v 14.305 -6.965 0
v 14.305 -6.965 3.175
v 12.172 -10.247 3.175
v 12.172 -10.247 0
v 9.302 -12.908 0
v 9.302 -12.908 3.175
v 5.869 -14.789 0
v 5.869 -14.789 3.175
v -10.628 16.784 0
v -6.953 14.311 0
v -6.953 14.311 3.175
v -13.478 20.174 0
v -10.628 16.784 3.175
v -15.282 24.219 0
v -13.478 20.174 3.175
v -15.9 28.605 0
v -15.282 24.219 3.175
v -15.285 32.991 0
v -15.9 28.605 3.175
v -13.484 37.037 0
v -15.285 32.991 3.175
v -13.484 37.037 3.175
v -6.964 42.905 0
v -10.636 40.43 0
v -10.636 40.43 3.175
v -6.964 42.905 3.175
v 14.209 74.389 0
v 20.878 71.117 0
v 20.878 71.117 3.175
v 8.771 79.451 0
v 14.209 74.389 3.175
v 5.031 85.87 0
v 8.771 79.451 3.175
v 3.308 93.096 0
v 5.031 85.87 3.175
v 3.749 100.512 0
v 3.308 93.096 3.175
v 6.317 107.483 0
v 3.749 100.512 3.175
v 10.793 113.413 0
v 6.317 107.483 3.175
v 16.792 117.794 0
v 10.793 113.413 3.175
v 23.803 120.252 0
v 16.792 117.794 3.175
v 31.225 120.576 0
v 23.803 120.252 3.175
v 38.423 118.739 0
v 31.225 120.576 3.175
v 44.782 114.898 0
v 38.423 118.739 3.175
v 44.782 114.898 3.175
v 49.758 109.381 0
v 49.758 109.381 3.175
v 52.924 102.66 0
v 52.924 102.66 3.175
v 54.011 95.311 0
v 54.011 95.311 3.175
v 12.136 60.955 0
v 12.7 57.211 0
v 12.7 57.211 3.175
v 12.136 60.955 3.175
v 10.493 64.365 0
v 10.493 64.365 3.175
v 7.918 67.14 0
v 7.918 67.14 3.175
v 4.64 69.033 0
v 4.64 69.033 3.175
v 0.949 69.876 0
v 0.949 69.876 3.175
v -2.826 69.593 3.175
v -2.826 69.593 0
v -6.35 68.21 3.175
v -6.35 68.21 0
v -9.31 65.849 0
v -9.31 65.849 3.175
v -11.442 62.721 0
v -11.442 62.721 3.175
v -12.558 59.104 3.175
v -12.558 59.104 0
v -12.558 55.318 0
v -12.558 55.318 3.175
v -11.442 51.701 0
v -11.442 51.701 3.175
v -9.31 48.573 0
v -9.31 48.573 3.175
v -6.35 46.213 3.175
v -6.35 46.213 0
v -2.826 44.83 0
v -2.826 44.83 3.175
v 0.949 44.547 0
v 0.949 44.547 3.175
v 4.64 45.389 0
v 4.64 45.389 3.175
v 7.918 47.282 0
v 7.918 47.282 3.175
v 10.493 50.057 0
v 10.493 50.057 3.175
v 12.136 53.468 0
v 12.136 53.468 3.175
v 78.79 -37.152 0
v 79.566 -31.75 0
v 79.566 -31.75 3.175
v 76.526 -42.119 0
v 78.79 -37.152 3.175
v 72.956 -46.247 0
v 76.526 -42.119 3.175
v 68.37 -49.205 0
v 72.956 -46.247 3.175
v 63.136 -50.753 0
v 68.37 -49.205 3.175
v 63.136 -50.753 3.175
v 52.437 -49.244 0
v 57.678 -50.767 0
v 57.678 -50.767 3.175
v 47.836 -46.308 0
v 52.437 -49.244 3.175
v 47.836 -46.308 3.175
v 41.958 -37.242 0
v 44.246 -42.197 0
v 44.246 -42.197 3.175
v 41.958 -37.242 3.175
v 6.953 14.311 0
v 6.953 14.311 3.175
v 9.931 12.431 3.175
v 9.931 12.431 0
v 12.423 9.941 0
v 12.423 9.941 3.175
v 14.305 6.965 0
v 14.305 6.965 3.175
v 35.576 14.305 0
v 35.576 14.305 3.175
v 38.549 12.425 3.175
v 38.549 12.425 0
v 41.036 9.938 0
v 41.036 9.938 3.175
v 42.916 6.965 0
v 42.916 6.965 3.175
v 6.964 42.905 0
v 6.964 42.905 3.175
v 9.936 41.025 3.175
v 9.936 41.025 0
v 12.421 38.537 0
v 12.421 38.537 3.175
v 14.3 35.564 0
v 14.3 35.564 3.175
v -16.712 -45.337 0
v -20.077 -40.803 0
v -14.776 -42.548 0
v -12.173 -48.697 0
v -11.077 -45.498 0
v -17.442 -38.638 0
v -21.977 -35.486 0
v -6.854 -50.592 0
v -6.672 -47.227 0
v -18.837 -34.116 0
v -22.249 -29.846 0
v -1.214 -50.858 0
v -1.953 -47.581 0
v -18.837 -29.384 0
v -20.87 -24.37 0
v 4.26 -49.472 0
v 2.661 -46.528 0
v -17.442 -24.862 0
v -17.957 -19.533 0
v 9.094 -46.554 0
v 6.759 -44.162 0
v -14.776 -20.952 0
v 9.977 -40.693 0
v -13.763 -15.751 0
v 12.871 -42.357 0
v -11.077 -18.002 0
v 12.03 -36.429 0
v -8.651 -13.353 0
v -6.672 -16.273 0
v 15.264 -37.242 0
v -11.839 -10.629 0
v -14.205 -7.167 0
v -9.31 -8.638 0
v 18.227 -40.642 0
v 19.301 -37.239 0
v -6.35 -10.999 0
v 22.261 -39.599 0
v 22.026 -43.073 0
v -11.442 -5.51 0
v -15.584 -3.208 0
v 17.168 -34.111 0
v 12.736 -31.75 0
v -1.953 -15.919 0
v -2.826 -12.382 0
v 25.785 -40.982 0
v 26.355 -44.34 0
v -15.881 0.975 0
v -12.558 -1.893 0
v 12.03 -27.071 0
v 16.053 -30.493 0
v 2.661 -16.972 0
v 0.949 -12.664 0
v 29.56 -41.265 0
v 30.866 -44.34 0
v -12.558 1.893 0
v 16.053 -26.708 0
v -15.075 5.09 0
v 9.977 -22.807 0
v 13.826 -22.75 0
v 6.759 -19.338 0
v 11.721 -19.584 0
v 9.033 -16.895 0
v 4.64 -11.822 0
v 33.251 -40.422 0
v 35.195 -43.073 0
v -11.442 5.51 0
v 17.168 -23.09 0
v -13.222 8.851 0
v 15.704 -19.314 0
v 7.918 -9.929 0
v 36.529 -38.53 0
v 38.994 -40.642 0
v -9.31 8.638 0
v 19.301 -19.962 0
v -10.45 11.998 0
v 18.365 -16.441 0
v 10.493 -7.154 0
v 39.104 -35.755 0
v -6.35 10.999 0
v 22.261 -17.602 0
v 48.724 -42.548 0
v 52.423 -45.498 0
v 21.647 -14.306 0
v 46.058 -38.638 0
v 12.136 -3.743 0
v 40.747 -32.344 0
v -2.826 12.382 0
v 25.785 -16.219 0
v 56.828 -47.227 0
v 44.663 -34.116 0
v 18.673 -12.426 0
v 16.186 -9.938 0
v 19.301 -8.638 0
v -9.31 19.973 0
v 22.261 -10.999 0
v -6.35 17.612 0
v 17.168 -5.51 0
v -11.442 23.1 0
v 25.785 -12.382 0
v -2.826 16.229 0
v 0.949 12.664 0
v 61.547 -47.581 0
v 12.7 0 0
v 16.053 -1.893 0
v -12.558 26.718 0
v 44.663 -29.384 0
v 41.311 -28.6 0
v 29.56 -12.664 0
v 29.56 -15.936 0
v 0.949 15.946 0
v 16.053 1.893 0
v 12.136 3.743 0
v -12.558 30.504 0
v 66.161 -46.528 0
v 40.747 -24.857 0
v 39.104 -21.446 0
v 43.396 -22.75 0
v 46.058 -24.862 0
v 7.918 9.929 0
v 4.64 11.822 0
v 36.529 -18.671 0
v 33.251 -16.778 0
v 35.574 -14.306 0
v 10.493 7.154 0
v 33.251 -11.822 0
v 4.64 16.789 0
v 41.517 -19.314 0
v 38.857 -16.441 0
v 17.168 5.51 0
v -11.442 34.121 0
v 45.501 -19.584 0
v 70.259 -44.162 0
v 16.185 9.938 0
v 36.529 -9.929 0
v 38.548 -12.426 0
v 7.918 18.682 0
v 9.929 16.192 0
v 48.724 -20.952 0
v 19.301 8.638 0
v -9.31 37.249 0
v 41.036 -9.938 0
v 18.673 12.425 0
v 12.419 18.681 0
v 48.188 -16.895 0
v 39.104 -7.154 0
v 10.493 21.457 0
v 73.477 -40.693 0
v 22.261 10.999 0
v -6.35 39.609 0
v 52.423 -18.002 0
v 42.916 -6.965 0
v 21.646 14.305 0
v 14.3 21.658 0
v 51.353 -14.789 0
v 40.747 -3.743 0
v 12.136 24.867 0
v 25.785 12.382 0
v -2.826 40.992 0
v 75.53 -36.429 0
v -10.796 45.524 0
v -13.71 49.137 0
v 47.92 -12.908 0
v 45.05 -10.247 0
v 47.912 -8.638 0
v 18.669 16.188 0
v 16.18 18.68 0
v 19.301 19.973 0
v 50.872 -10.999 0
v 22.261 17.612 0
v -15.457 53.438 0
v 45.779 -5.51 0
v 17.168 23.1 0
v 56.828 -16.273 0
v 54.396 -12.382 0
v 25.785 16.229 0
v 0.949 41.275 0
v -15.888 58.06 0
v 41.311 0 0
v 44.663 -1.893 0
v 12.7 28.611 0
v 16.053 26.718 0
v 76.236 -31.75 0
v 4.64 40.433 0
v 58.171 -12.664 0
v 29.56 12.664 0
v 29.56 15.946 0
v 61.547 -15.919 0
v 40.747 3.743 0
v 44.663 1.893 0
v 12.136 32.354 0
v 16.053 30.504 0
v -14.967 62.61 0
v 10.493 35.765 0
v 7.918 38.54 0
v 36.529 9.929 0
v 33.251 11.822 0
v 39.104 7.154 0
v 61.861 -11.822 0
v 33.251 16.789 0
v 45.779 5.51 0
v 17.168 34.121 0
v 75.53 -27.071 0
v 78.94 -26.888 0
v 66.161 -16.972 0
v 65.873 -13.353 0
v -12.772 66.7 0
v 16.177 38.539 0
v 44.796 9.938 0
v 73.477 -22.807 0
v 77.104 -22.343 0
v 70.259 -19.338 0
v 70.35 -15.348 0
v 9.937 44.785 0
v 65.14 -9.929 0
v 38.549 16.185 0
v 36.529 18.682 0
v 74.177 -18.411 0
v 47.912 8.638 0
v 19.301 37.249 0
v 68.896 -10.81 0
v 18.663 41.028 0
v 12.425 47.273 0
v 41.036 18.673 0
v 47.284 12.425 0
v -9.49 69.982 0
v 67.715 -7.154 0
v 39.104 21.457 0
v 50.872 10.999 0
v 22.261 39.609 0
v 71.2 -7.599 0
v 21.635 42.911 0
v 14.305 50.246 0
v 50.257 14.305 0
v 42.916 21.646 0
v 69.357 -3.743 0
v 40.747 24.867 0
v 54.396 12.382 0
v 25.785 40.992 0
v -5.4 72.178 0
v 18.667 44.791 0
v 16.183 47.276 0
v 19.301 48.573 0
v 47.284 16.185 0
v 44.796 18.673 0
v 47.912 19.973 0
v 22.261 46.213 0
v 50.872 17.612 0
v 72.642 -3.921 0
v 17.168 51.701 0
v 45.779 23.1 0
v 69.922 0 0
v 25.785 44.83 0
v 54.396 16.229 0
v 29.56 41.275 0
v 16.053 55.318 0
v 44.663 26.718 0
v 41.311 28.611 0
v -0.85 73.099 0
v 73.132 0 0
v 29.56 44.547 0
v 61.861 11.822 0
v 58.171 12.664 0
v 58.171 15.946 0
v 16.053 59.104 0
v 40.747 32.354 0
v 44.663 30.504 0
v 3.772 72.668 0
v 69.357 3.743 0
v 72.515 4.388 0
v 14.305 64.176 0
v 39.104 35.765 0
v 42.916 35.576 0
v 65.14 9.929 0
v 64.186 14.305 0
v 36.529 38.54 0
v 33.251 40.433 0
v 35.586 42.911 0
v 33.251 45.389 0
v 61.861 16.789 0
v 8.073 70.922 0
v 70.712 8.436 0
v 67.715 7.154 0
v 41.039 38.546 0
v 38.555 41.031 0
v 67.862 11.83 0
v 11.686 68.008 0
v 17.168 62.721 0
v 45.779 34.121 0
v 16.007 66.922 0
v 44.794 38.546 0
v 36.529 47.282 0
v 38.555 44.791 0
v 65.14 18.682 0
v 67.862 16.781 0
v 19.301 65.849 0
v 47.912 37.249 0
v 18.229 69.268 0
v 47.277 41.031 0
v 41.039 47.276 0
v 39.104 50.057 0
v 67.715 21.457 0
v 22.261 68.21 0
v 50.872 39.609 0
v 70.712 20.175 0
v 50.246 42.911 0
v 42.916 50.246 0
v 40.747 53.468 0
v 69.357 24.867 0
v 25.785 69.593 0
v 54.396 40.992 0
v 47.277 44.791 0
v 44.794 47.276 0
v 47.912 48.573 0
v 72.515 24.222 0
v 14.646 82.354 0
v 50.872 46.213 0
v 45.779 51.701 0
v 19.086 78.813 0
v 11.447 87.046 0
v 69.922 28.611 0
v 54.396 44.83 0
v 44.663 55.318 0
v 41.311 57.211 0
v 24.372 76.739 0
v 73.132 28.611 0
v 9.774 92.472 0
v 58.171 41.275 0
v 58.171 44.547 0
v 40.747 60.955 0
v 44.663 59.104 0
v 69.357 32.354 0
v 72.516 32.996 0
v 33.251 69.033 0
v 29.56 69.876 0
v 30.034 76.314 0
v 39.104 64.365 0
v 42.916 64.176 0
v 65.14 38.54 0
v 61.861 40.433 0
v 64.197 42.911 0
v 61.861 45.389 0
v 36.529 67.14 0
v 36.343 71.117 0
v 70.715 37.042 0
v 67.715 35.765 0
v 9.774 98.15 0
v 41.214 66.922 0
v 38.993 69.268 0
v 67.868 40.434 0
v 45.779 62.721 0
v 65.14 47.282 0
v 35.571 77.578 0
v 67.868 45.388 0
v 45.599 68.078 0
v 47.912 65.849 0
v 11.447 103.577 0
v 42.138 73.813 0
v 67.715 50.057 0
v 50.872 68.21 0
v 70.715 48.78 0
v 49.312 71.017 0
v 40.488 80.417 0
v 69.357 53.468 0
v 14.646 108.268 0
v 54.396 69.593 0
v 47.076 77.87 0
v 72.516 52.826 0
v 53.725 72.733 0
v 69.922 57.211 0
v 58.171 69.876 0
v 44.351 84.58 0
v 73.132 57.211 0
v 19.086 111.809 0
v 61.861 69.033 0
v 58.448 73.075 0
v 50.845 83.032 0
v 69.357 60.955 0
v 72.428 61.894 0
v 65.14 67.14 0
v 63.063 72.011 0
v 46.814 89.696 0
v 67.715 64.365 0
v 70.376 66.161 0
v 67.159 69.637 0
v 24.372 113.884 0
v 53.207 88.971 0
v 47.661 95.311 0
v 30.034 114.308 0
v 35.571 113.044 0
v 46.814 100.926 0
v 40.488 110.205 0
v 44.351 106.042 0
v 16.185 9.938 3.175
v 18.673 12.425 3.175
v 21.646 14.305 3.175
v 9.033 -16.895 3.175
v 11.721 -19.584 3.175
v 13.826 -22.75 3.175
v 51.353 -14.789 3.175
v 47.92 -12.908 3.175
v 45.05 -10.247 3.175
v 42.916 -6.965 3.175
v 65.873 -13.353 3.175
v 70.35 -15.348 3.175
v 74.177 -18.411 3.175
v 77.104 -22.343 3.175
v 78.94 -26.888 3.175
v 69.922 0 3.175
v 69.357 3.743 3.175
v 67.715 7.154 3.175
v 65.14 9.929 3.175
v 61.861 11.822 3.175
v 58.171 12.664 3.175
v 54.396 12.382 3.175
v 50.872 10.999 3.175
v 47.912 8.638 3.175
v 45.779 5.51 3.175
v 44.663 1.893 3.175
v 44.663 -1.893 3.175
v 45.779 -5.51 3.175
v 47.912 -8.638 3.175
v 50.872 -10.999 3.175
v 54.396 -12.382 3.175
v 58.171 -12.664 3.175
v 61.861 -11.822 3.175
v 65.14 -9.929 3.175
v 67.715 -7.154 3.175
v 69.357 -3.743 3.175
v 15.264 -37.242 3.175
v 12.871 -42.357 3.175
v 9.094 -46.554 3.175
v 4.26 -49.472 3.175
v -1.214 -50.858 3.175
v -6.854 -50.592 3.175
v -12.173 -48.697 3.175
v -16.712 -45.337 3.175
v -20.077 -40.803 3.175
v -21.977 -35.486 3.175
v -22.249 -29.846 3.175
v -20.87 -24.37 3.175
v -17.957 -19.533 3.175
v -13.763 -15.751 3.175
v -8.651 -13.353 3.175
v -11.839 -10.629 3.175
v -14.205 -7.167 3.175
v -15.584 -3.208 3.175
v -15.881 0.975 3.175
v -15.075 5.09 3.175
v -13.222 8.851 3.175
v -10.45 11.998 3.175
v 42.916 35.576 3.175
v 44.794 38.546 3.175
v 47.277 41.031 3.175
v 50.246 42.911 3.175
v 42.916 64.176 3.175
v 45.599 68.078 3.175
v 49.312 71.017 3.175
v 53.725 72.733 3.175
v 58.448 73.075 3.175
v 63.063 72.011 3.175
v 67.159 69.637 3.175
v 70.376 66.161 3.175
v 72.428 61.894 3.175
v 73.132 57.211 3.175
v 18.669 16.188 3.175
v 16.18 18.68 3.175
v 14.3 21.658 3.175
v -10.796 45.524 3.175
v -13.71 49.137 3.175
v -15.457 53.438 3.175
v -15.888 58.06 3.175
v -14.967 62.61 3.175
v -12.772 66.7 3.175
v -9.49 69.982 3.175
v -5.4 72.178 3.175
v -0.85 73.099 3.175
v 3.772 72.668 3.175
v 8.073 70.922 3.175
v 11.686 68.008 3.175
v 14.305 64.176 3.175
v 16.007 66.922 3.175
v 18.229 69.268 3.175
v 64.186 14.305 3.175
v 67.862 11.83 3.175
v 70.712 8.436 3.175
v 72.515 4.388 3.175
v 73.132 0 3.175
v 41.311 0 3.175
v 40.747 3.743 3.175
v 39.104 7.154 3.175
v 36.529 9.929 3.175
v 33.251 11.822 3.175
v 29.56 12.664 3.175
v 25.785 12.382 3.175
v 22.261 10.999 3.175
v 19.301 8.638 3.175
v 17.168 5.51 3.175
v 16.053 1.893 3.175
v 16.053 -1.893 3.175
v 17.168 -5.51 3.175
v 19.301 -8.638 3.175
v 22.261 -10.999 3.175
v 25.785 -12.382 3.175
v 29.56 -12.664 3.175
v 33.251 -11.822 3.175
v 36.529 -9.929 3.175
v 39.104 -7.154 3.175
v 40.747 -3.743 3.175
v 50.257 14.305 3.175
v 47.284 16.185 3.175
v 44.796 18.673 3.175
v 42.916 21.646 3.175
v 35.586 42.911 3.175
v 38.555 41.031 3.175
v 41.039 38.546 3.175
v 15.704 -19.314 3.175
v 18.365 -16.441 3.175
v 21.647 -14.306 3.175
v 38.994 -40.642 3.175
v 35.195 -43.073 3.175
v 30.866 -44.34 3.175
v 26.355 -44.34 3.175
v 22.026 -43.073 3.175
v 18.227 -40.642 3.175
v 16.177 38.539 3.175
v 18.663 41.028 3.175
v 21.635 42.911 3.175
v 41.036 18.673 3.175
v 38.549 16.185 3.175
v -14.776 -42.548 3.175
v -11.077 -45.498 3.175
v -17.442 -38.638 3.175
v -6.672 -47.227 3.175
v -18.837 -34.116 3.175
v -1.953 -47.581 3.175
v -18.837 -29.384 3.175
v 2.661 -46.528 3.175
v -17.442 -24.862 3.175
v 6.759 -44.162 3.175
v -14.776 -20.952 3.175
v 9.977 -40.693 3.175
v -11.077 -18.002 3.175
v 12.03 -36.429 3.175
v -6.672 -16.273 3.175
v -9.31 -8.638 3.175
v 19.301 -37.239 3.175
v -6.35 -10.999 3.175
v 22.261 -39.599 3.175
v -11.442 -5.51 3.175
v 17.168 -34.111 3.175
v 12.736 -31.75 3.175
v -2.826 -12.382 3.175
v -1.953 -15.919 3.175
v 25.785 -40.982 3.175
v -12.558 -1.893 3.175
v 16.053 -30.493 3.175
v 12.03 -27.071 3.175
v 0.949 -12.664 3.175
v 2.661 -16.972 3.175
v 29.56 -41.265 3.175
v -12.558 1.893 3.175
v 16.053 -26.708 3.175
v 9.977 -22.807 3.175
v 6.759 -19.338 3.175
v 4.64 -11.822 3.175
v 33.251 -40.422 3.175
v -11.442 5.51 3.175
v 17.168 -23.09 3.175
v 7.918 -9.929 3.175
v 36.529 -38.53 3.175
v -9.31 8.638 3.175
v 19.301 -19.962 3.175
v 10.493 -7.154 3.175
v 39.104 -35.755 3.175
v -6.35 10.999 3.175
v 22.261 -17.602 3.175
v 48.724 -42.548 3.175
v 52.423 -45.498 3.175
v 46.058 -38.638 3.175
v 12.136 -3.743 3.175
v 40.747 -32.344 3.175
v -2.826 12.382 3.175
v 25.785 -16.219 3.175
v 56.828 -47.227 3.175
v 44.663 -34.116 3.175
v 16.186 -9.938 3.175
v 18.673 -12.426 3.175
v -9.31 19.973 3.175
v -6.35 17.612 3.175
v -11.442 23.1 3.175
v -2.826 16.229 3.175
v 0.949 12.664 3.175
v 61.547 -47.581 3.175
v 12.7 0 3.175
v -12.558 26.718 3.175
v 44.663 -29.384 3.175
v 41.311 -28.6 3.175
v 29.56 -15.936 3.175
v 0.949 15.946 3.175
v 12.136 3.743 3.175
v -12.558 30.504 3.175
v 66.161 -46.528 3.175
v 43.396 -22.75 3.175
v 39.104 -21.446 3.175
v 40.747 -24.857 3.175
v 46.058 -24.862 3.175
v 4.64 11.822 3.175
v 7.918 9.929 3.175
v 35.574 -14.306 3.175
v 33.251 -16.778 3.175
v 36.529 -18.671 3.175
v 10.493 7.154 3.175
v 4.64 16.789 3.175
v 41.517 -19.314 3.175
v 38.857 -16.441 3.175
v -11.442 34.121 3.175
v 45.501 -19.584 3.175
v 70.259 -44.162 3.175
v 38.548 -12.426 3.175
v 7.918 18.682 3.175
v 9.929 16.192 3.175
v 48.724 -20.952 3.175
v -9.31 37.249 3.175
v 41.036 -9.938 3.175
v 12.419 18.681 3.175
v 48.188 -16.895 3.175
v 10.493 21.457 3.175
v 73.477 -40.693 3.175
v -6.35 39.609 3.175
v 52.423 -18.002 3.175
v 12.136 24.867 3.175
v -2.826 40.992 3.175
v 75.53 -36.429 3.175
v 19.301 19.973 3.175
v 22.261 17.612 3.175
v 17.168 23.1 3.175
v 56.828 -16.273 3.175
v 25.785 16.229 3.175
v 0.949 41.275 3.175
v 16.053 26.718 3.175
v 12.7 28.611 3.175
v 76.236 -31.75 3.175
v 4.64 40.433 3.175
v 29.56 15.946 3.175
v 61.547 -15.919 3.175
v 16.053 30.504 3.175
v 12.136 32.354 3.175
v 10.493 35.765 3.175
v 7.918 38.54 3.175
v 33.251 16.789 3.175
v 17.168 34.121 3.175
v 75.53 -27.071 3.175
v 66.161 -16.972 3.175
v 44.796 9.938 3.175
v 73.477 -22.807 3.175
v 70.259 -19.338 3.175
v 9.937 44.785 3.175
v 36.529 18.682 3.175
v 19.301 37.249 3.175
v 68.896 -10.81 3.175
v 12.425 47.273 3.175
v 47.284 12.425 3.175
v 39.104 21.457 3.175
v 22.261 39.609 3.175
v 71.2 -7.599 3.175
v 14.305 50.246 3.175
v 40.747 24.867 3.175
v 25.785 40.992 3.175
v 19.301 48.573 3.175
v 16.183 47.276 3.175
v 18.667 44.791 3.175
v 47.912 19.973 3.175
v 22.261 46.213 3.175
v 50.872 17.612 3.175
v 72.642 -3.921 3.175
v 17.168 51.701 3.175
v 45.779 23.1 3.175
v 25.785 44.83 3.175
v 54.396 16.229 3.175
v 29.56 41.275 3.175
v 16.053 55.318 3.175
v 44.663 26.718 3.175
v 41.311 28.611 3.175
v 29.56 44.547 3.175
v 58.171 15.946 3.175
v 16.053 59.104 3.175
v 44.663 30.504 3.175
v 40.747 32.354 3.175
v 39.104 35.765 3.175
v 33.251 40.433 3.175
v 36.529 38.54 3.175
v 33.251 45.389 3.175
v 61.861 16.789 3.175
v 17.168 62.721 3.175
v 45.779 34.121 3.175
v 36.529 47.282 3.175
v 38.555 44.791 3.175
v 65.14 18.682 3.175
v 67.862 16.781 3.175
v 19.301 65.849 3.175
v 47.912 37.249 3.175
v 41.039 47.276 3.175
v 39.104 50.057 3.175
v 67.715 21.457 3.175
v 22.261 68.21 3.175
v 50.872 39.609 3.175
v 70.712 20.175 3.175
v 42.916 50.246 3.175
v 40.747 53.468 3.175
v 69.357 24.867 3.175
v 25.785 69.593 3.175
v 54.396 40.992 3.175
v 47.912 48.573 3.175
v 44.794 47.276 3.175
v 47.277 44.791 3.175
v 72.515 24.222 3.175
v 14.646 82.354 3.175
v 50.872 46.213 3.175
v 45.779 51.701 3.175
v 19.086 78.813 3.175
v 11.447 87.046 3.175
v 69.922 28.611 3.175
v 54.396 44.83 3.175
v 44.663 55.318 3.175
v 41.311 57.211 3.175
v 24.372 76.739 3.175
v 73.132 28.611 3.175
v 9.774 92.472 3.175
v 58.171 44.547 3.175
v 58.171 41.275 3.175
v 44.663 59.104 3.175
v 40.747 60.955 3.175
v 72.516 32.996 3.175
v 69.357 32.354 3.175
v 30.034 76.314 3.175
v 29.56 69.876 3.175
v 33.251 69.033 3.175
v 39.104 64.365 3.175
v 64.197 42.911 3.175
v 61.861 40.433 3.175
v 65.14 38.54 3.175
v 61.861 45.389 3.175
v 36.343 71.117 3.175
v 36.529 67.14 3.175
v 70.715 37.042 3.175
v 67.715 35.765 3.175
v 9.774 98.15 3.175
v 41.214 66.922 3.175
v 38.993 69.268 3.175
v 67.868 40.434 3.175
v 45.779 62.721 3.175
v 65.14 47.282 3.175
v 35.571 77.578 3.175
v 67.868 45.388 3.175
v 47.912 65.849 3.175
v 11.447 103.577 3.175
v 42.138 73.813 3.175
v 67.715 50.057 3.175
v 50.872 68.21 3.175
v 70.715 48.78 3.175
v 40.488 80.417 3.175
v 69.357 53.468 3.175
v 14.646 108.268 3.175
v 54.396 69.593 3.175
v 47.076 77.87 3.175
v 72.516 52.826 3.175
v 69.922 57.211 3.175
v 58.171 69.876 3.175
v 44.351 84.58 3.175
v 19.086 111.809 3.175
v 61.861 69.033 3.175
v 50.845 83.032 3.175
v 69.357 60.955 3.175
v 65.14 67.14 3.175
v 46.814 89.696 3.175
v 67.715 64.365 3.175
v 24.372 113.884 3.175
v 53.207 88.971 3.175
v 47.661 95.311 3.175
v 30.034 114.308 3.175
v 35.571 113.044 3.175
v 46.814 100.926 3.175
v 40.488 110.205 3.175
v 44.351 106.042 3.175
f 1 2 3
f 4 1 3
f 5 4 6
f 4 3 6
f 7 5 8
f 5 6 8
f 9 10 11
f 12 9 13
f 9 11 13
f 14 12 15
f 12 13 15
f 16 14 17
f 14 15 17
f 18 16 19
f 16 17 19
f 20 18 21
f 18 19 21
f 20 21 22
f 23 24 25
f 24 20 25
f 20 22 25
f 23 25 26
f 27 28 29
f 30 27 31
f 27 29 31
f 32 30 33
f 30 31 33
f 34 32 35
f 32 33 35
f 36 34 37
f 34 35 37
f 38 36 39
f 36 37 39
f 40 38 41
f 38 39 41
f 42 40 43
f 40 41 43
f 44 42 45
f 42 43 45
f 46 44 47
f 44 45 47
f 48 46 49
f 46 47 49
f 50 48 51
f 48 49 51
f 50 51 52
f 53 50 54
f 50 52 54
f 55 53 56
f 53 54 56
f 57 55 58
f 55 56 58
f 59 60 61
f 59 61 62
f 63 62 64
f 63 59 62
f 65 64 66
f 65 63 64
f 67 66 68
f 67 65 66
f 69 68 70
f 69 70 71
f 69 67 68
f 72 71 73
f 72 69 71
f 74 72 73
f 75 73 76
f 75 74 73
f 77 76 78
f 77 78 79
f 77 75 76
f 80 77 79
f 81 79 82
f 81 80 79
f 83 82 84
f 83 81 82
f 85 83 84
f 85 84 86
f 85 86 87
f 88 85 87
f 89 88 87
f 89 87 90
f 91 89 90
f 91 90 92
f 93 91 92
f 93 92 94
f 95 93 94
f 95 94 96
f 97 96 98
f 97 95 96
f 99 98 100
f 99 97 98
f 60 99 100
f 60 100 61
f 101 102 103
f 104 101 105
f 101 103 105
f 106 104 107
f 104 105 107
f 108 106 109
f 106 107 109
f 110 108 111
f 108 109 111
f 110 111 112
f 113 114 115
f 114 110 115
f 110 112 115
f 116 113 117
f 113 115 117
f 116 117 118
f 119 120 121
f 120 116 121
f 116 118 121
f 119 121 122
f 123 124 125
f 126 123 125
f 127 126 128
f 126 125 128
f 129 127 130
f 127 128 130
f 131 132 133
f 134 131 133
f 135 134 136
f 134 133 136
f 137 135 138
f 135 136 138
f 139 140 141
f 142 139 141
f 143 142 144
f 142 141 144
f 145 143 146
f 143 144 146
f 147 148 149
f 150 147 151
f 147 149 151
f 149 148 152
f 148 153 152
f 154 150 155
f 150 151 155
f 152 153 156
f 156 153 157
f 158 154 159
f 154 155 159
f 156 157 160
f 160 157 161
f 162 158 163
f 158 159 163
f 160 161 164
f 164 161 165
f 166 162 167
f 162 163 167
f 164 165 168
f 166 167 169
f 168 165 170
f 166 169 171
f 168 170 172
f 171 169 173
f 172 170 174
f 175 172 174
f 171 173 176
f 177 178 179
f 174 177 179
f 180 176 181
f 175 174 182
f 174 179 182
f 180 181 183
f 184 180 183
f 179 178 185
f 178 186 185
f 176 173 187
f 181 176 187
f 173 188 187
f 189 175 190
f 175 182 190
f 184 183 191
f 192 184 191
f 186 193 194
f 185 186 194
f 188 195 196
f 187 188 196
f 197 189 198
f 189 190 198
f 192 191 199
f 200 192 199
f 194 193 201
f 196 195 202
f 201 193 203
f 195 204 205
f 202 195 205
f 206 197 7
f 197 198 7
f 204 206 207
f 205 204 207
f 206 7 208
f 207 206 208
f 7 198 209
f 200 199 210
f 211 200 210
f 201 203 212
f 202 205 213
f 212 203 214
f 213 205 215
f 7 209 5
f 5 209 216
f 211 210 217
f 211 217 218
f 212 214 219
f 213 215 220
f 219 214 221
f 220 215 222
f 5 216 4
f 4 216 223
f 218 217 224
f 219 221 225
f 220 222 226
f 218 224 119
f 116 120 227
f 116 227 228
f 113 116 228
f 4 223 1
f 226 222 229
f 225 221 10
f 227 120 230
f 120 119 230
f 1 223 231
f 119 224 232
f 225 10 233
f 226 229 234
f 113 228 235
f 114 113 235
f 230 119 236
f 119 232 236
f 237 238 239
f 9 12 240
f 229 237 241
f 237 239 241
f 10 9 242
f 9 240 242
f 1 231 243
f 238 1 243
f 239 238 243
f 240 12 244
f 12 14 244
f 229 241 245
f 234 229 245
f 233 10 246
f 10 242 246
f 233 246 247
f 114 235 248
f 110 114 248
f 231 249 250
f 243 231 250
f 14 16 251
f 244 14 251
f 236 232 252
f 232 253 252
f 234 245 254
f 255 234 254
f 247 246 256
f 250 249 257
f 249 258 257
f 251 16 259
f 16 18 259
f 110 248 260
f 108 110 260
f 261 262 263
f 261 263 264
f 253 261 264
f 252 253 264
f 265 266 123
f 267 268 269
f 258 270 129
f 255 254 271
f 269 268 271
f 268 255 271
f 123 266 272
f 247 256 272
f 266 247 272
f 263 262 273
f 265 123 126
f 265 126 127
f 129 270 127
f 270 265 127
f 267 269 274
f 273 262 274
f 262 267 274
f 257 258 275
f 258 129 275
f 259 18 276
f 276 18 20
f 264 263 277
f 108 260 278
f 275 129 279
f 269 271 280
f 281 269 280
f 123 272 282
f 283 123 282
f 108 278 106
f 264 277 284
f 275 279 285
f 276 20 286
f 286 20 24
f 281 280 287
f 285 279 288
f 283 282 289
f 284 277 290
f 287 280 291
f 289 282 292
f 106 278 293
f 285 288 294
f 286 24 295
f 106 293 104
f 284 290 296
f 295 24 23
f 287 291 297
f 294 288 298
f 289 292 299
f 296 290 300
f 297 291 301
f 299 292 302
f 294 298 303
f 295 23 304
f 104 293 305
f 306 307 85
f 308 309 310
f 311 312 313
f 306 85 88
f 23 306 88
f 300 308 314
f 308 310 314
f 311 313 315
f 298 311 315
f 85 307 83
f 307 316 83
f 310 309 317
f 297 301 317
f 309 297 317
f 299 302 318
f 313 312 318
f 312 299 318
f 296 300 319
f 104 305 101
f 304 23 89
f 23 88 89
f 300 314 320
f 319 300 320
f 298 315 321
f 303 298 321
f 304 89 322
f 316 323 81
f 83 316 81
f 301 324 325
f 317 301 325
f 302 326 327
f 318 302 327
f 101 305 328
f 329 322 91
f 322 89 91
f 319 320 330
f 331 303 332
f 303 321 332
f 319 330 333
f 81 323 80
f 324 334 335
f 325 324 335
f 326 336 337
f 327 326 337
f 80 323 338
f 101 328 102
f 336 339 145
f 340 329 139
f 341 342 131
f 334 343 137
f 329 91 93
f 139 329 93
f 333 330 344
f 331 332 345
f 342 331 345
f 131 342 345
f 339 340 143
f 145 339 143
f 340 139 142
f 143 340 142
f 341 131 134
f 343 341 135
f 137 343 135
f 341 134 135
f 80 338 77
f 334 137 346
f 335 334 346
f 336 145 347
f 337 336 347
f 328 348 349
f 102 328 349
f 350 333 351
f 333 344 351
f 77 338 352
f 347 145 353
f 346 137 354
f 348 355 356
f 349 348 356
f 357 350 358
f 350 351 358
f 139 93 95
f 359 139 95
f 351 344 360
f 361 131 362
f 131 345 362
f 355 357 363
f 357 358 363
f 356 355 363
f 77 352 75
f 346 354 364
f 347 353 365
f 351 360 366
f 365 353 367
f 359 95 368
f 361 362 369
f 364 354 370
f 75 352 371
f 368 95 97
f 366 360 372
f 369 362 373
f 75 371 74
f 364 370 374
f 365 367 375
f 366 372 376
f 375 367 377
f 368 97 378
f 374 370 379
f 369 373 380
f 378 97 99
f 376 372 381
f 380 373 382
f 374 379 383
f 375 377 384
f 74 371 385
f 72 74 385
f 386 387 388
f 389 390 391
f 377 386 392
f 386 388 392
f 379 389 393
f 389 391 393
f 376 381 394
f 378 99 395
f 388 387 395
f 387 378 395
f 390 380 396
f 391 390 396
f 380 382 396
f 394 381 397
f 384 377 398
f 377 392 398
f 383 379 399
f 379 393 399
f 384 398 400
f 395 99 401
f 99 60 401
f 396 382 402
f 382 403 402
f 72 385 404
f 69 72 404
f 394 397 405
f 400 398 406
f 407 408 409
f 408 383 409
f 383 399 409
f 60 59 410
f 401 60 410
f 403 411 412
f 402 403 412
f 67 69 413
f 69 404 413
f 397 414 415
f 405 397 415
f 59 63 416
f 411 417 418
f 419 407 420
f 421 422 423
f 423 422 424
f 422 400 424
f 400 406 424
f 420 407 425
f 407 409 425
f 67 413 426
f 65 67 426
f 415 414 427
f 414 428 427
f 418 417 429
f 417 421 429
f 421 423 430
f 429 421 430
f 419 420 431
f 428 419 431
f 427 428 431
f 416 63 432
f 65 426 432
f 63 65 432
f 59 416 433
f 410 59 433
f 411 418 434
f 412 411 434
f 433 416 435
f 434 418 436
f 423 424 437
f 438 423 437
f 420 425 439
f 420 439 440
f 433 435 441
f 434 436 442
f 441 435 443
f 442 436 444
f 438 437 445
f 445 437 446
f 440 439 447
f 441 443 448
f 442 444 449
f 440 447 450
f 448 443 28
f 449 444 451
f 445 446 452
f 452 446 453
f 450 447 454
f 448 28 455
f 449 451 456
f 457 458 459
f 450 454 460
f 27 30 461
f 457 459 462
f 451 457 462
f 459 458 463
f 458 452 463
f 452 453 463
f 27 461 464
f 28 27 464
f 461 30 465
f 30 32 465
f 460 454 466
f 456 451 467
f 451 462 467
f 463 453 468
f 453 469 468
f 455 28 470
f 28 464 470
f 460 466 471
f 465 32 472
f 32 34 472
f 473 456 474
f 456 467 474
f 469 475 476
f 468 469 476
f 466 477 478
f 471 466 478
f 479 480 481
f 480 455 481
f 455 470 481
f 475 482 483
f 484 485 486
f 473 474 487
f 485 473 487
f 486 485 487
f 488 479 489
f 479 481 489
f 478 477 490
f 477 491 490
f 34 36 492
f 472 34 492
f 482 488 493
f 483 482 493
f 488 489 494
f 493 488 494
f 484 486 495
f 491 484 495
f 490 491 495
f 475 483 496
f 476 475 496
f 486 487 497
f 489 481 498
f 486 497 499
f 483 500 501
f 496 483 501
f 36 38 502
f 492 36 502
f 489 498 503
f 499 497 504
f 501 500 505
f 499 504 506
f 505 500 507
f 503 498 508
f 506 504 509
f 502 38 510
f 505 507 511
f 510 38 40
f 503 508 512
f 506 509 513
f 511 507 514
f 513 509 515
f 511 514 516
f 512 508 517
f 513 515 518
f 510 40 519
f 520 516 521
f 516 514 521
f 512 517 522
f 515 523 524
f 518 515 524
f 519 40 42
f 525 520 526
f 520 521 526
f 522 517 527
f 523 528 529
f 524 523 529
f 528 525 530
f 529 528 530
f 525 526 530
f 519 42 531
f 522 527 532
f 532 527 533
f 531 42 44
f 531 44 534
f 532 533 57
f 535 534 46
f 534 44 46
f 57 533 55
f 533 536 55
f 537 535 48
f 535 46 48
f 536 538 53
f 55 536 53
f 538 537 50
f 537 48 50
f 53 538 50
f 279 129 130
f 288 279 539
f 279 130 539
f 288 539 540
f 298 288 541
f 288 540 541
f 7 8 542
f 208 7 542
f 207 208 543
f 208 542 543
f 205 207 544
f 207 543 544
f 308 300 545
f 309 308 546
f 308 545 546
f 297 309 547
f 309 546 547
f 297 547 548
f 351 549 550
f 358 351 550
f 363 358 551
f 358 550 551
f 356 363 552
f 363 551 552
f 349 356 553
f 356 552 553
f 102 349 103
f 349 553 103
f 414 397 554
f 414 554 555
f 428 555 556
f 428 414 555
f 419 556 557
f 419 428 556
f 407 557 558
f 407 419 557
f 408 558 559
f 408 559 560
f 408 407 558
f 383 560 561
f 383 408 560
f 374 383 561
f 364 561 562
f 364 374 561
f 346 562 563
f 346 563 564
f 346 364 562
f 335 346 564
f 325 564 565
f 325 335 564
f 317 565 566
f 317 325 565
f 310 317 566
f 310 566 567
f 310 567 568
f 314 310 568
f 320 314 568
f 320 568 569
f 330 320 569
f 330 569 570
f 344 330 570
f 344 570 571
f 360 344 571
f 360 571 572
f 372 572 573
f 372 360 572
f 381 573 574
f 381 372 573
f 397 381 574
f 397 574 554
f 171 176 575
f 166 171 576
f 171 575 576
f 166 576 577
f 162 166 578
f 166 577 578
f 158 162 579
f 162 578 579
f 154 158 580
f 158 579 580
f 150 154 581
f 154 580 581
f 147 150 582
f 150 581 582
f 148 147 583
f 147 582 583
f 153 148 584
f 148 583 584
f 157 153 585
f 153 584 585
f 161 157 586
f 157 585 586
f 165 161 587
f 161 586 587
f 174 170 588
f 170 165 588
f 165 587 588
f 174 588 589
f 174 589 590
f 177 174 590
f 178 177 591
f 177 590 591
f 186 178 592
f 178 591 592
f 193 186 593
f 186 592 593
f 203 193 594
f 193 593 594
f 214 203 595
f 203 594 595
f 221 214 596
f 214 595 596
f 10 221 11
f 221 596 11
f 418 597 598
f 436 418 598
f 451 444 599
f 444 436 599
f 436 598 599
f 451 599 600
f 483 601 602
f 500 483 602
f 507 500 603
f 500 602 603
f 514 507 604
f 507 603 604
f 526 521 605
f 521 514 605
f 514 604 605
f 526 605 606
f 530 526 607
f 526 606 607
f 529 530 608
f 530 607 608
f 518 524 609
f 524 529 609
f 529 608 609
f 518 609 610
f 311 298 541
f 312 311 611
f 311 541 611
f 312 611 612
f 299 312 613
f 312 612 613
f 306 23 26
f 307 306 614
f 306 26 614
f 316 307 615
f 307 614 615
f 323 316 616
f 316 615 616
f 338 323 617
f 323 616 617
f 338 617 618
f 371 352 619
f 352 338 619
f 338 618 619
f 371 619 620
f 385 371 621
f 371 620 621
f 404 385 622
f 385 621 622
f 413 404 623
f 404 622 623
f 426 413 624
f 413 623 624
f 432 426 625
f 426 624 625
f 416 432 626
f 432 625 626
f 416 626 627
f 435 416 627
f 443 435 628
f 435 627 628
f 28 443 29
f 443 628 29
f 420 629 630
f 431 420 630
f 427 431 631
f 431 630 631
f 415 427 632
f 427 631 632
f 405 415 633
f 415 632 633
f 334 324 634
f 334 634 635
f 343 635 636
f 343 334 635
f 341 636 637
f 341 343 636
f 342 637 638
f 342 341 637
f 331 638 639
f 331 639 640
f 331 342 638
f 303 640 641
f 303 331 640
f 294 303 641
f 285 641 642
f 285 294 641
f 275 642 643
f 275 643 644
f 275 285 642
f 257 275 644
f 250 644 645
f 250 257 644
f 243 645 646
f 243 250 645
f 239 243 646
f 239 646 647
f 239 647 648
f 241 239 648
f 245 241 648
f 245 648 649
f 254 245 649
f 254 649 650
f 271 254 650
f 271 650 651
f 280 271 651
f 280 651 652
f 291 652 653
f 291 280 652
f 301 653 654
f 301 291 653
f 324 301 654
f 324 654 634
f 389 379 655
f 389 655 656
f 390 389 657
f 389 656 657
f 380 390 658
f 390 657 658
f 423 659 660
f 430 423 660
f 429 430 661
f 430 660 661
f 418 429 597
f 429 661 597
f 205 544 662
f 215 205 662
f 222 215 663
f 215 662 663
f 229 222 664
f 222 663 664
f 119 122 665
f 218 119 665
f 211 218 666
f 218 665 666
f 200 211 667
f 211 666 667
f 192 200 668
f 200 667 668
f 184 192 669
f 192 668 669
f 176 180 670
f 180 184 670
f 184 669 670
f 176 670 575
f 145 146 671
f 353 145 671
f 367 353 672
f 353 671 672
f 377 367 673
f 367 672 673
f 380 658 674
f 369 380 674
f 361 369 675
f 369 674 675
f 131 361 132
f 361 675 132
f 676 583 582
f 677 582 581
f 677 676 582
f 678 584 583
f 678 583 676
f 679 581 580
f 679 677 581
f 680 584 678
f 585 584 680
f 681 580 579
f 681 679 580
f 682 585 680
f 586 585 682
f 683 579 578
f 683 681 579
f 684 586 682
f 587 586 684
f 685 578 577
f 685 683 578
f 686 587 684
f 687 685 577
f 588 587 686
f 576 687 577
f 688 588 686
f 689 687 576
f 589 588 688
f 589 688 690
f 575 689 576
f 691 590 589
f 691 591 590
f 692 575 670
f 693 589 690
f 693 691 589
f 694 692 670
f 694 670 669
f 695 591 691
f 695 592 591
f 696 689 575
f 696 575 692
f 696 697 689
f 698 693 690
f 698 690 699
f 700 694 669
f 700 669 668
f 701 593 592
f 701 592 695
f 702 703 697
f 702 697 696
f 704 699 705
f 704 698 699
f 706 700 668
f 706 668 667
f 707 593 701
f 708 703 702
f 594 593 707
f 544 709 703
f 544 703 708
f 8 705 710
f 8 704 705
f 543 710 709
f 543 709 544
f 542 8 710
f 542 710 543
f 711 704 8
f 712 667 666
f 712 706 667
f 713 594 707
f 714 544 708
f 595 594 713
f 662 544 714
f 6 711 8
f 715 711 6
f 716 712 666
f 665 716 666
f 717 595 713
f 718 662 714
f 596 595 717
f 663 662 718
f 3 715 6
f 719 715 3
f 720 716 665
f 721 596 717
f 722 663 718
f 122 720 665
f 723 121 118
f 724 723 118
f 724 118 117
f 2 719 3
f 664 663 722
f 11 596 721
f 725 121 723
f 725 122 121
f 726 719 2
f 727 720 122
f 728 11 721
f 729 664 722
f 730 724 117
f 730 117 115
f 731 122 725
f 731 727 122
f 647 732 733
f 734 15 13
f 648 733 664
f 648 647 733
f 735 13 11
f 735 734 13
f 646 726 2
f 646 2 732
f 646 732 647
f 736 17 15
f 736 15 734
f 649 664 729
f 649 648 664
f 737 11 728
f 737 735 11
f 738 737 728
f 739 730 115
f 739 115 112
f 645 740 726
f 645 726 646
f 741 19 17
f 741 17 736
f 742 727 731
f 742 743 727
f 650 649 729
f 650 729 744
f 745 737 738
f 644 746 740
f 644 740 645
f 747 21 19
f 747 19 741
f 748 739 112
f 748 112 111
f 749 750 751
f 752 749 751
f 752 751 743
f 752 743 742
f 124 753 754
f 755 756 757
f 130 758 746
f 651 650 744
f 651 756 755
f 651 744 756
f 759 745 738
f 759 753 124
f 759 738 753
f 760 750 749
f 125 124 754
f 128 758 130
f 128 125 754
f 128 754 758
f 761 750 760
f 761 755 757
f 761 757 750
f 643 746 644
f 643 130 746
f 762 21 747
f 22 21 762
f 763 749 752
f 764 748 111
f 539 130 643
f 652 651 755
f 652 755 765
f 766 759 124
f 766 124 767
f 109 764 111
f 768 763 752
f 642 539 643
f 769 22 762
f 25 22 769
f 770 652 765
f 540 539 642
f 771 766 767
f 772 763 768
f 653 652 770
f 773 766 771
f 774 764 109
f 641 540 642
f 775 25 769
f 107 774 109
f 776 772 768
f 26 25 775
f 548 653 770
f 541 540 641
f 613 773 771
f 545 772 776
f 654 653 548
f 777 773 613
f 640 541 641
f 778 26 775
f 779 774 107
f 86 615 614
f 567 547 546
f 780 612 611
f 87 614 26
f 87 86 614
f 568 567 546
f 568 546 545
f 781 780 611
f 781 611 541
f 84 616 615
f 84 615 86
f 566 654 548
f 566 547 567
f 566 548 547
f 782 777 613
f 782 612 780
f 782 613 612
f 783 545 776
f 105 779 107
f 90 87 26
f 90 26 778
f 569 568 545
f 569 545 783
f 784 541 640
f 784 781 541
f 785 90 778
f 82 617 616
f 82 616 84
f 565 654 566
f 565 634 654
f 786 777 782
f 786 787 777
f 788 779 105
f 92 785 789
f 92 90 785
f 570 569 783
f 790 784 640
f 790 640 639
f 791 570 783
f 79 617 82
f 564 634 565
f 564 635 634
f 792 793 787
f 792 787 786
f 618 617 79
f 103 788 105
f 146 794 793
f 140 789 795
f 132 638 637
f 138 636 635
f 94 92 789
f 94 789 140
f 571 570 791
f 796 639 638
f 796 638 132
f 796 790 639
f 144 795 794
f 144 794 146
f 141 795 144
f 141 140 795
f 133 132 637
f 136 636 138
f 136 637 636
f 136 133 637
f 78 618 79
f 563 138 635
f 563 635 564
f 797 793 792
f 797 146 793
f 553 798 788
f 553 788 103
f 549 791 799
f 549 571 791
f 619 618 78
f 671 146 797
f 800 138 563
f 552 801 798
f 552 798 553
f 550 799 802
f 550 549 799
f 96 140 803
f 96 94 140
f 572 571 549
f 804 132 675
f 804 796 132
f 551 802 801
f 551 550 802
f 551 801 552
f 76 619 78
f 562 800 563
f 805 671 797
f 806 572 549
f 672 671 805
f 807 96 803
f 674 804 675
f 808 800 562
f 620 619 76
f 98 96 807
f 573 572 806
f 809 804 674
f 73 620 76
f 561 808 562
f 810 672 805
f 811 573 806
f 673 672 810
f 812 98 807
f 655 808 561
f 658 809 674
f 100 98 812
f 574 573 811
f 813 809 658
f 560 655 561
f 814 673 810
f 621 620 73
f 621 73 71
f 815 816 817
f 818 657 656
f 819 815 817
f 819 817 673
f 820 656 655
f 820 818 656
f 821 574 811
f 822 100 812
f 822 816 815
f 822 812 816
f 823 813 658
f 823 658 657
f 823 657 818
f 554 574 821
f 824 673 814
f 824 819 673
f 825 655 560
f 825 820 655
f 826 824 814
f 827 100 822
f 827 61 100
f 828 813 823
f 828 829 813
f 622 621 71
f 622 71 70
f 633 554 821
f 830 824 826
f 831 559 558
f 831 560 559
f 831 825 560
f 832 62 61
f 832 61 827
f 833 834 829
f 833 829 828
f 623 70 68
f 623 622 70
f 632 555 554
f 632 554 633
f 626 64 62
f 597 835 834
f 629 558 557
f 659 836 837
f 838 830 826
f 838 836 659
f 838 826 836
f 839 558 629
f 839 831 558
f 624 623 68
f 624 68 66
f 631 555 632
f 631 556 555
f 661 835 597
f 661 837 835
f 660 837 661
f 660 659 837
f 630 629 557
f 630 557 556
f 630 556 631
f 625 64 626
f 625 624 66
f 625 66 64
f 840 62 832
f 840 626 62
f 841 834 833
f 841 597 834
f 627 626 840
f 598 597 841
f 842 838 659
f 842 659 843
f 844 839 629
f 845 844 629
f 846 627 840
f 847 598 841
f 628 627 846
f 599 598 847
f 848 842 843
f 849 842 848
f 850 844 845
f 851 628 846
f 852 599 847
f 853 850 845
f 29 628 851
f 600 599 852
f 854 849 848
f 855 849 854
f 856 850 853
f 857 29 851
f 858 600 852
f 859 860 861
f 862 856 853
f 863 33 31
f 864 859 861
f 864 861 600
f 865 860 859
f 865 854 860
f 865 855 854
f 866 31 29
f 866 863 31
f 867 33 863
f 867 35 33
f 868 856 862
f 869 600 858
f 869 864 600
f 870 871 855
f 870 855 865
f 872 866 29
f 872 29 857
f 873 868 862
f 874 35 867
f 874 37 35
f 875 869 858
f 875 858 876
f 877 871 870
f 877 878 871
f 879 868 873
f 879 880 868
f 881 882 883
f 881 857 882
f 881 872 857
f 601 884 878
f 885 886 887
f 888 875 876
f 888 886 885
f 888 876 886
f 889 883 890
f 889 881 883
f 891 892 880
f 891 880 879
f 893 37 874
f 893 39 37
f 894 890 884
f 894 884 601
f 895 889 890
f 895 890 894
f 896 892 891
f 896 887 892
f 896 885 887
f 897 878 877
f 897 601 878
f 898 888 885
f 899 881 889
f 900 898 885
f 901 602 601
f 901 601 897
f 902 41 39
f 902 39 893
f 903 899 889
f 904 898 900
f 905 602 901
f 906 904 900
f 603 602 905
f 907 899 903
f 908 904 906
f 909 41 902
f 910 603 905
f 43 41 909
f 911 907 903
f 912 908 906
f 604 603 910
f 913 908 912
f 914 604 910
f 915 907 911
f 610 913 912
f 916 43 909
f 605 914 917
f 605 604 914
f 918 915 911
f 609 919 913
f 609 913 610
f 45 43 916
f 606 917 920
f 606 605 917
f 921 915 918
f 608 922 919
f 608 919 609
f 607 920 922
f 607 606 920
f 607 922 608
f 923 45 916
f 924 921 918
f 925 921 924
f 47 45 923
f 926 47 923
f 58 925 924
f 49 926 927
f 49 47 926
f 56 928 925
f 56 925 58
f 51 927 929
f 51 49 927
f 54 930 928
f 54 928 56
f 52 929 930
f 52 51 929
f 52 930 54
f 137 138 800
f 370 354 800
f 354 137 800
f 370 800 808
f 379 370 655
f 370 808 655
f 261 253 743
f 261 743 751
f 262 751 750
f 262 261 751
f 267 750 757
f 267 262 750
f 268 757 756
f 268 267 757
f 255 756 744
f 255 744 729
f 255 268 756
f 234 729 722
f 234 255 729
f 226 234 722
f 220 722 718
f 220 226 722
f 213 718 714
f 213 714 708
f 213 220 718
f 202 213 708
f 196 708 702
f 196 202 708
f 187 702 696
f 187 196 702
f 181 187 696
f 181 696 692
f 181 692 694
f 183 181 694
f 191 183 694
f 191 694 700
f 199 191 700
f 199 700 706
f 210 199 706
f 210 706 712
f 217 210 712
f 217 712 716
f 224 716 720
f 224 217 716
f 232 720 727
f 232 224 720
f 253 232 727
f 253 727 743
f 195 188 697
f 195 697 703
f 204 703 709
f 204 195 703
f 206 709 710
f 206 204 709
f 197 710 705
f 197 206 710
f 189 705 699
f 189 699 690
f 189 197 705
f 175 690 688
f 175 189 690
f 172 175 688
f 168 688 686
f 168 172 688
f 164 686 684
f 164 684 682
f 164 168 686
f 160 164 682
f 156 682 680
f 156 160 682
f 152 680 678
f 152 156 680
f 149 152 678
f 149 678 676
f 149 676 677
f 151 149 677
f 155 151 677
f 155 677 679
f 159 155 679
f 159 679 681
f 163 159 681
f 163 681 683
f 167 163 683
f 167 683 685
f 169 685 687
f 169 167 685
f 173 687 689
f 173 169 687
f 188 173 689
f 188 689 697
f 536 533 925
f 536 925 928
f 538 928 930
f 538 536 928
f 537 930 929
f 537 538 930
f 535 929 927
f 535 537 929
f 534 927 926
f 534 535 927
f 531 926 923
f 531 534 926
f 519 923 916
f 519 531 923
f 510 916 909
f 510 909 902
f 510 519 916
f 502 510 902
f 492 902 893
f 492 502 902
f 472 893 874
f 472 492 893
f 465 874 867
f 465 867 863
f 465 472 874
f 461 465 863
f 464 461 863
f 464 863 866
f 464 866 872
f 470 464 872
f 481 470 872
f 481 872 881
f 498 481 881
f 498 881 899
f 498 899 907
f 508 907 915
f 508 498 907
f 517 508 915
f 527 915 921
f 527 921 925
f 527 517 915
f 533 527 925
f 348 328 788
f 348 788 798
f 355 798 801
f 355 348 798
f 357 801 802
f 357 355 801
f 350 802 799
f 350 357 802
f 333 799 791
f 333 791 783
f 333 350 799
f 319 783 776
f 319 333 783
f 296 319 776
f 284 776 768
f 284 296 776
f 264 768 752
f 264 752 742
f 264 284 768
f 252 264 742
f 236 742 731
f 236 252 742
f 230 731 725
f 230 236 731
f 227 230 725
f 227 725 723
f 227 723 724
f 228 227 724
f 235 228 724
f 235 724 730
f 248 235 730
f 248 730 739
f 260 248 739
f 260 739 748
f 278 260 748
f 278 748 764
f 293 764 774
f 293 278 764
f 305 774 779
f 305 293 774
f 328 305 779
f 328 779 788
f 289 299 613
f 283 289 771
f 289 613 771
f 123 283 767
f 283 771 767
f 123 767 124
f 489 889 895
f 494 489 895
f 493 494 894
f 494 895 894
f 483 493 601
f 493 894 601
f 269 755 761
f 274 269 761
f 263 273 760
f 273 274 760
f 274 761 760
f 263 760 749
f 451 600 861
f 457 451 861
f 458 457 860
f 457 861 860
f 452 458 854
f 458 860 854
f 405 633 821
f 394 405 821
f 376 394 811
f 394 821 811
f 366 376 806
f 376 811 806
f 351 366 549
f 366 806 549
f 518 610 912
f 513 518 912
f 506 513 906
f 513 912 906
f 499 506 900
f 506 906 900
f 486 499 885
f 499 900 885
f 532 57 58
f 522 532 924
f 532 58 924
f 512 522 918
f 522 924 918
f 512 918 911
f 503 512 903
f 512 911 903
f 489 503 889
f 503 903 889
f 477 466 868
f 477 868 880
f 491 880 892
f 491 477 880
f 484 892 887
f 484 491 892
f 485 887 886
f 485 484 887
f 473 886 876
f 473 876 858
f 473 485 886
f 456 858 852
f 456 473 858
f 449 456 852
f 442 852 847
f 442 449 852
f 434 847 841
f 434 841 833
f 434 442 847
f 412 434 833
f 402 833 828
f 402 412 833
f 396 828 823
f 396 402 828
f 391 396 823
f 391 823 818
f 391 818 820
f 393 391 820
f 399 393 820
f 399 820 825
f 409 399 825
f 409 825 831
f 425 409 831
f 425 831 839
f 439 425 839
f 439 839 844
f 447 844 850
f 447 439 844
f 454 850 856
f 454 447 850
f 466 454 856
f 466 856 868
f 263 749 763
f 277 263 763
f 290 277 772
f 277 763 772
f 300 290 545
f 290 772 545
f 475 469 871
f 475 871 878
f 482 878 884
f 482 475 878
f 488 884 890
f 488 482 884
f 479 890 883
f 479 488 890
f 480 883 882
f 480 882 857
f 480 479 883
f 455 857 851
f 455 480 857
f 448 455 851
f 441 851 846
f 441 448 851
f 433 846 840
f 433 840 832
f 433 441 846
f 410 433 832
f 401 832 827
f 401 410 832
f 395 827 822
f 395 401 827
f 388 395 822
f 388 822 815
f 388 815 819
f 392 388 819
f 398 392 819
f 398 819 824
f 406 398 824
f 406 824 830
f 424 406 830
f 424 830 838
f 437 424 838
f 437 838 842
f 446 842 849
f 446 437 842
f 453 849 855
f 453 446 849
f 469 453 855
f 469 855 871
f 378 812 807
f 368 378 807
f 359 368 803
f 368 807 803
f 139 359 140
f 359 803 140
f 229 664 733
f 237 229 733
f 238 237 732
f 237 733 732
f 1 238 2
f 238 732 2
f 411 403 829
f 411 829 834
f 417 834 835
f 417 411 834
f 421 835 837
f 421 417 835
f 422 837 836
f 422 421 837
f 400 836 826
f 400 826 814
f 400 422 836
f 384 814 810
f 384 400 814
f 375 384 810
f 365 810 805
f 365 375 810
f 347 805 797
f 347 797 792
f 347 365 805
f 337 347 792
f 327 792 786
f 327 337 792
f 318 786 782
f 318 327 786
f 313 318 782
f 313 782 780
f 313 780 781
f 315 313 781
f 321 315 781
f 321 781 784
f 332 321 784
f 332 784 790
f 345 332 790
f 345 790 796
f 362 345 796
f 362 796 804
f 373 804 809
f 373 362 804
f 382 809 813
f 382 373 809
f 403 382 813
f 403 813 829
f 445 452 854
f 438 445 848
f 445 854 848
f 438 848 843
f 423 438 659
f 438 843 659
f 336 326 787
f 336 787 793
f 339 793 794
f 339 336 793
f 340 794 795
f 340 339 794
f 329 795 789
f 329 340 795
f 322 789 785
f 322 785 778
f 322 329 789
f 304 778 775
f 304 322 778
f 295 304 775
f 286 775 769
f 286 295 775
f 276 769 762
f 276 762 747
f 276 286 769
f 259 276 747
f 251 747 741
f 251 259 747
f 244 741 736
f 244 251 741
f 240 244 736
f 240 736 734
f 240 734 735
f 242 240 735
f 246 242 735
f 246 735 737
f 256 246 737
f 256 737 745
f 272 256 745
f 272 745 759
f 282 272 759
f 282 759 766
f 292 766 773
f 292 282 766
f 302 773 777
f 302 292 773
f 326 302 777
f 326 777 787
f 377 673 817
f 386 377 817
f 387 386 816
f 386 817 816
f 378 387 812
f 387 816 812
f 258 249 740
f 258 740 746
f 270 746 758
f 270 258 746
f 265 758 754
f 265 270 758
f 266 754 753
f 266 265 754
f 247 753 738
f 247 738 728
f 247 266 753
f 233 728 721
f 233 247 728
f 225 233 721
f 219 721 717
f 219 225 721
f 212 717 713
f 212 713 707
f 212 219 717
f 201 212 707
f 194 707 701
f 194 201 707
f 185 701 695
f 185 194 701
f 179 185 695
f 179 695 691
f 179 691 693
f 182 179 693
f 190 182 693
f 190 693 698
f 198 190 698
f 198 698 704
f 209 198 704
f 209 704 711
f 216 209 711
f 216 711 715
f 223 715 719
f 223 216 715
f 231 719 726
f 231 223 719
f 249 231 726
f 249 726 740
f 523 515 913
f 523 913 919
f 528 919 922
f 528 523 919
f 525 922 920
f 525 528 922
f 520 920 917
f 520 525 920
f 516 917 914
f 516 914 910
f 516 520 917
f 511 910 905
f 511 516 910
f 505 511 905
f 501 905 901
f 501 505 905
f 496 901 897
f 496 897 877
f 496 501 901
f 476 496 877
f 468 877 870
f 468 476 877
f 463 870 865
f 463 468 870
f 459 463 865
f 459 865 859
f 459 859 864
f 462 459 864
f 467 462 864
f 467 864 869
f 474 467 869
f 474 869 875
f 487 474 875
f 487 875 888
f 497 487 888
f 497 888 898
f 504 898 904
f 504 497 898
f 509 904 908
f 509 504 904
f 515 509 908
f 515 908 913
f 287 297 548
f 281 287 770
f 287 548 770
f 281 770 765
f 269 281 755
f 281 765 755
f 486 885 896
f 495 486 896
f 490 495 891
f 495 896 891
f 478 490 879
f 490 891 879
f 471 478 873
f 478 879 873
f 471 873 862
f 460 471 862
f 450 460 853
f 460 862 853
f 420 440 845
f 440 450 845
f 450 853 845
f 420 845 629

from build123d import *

# Parameters (mm, degrees)
F0_W     = 112.4385967851
F0_H     = 188.8671554625
F0_R     = 15.875
F0_R_2   = 12.7
F0_R_3   = 19.05
F1_DEPTH = 3.175
F2_W     = 112.4385967851
F2_H     = 188.8671554625
F3_DEPTH = 25.4


with BuildPart() as f1:
    # F0 (on Top) → F1 (new body)
    with BuildSketch(Plane.XY):
        with Locations((28.6107622087, 28.6107677966)):
            Rectangle(F0_W, F0_H)
        with Locations((-3.1392377913, -31.75)):
            Circle(F0_R, mode=Mode.SUBTRACT)
        with Locations((28.6107622087, -28.6004)):
            Circle(F0_R_2, mode=Mode.SUBTRACT)
        Circle(F0_R_2, mode=Mode.SUBTRACT)
        with Locations((28.6107622087, 0)):
            Circle(F0_R_2, mode=Mode.SUBTRACT)
        with Locations((60.3607622087, -31.75)):
            Circle(F0_R, mode=Mode.SUBTRACT)
        with Locations((57.2215244174, 0)):
            Circle(F0_R_2, mode=Mode.SUBTRACT)
        with Locations((0, 28.6107677966)):
            Circle(F0_R_2, mode=Mode.SUBTRACT)
        with Locations((0, 57.2111677966)):
            Circle(F0_R_2, mode=Mode.SUBTRACT)
        with Locations((28.6107622087, 28.6107677966)):
            Circle(F0_R_2, mode=Mode.SUBTRACT)
        with Locations((28.6107622087, 57.2111677966)):
            Circle(F0_R_2, mode=Mode.SUBTRACT)
        with Locations((28.6107622087, 95.3111677966)):
            Circle(F0_R_3, mode=Mode.SUBTRACT)
        with Locations((57.2215244174, 28.6107677966)):
            Circle(F0_R_2, mode=Mode.SUBTRACT)
        with Locations((57.2215244174, 57.2111677966)):
            Circle(F0_R_2, mode=Mode.SUBTRACT)
    extrude(amount=F1_DEPTH)

    # F2 (on face) → F3 (cut)
    with BuildSketch(Plane.XY.offset(3.175)):
        with Locations((28.6107622087, 28.6107677966)):
            Rectangle(F2_W, F2_H)
        with BuildLine():
            ThreePointArc((20.8784768956, 71.1167105009), (13.6314439157, 115.824091125), (54.0107622087, 95.3111677966))
            ThreePointArc((54.0107622087, 95.3111677966), (49.1236855371, 80.3318495036), (36.3430475218, 71.1167105009))
            ThreePointArc((36.3430475218, 71.1167105009), (40.1631717397, 68.1516517023), (42.9161433131, 64.1759668261))
            ThreePointArc((42.9161433131, 64.1759668261), (60.7952365635, 72.715390949), (73.1322866261, 57.2111677966))
            ThreePointArc((73.1322866261, 57.2111677966), (70.7147963313, 48.7800369638), (64.1969551584, 42.9109677966))
            ThreePointArc((64.1969551584, 42.9109677966), (70.7147963313, 37.0418986294), (73.1322866261, 28.6107677966))
            ThreePointArc((73.1322866261, 28.6107677966), (70.7116620279, 20.1746228647), (64.1863240909, 14.3053870058))
            ThreePointArc((64.1863240909, 14.3053870058), (70.7116660444, 8.4361490481), (73.132292214, 0))
            ThreePointArc((73.132292214, 0), (71.2000982328, -7.5994740585), (65.8728052171, -13.3531970855))
            ThreePointArc((65.8728052171, -13.3531970855), (75.766649881, -20.2833701277), (79.5655786775, -31.75))
            ThreePointArc((79.5655786775, -31.75), (63.1358397408, -50.7532607805), (41.9579378153, -37.2419058575))
            ThreePointArc((41.9579378153, -37.2419058575), (28.6107622087, -44.5008), (15.2635866021, -37.2419058575))
            ThreePointArc((15.2635866021, -37.2419058575), (-16.7116606729, -45.3372849651), (-8.6512807997, -13.3531970855))
            ThreePointArc((-8.6512807997, -13.3531970855), (-15.8808701583, 0.9749332764), (-6.9529550782, 14.3111476674))
            ThreePointArc((-6.9529550782, 14.3111476674), (-15.9003988973, 28.6048460855), (-6.9636042292, 42.9052050468))
            ThreePointArc((-6.9636042292, 42.9052050468), (-11.2510776635, 68.4613058168), (14.3053811044, 64.1759668261))
            ThreePointArc((14.3053811044, 64.1759668261), (17.0583526777, 68.1516517023), (20.8784768956, 71.1167105009))
        make_face(mode=Mode.SUBTRACT)
        with BuildLine():
            ThreePointArc((14.3053811043, -6.9648117949), (10.8191046051, -11.6661693551), (5.8687746425, -14.7888476926))
            ThreePointArc((5.8687746425, -14.7888476926), (10.4436598742, -18.1731864338), (13.8259486181, -22.7495874708))
            ThreePointArc((13.8259486181, -22.7495874708), (16.9457643394, -17.795283394), (21.6471515982, -14.3059658585))
            ThreePointArc((21.6471515982, -14.3059658585), (17.3606227479, -11.2510841251), (14.3053811044, -6.9648117949))
        make_face()
        with BuildLine():
            ThreePointArc((35.5743728192, -14.3059658585), (40.275760078, -17.795283394), (43.3955757993, -22.7495874708))
            ThreePointArc((43.3955757993, -22.7495874708), (46.7778645432, -18.1731864338), (51.352749775, -14.7888476926))
            ThreePointArc((51.352749775, -14.7888476926), (46.4024198123, -11.6661693551), (42.9161433131, -6.9648117949))
            ThreePointArc((42.9161433131, -6.9648117949), (39.8609016695, -11.2510841251), (35.5743728192, -14.3059658585))
        make_face()
        with BuildLine():
            ThreePointArc((14.2996204416, 21.6578133609), (11.2432809162, 17.3674873857), (6.9529550782, 14.3111476674))
            ThreePointArc((6.9529550782, 14.3111476674), (11.2459493597, 11.2552723147), (14.3053811043, 6.9648117949))
            ThreePointArc((14.3053811044, 6.9648117949), (17.3601551723, 11.2506165694), (21.6459625352, 14.3053870058))
            ThreePointArc((21.6459625352, 14.3053870058), (17.355498357, 17.3648178728), (14.2996204416, 21.6578133609))
        make_face()
        with BuildLine():
            ThreePointArc((50.2567247439, 14.3053870058), (45.9709163125, 17.3601601983), (42.9161433131, 21.6459687672))
            ThreePointArc((42.9161433131, 21.6459687672), (39.8613703136, 17.3601601983), (35.5755618822, 14.3053870058))
            ThreePointArc((35.5755618822, 14.3053870058), (39.8613692451, 11.2506165694), (42.9161433131, 6.9648117949))
            ThreePointArc((42.9161433131, 6.9648117949), (45.970917381, 11.2506165694), (50.2567247439, 14.3053870058))
        make_face()
        with BuildLine():
            ThreePointArc((21.6353314677, 42.9109677966), (17.3559736701, 45.9647421861), (14.3053811044, 50.2463687672))
            ThreePointArc((14.3053811044, 50.2463687672), (11.2501380202, 45.9600901332), (6.9636042292, 42.9052050468))
            ThreePointArc((6.9636042292, 42.9052050468), (11.2474674185, 39.8498601457), (14.2996204416, 35.5637222323))
            ThreePointArc((14.2996204416, 35.5637222323), (17.3513196546, 39.8525340027), (21.6353314677, 42.9109677966))
        make_face()
        with BuildLine():
            ThreePointArc((50.2460936764, 42.9109677966), (45.9667358788, 45.9647421861), (42.9161433131, 50.2463687672))
            ThreePointArc((42.9161433131, 50.2463687672), (39.8655507473, 45.9647421861), (35.5861929497, 42.9109677966))
            ThreePointArc((35.5861929497, 42.9109677966), (39.8655507473, 39.8571934072), (42.9161433131, 35.5755668261))
            ThreePointArc((42.9161433131, 35.5755668261), (45.9667358788, 39.8571934072), (50.2460936764, 42.9109677966))
        make_face()
    extrude(amount=-F3_DEPTH, mode=Mode.SUBTRACT)


solid = f1.part
